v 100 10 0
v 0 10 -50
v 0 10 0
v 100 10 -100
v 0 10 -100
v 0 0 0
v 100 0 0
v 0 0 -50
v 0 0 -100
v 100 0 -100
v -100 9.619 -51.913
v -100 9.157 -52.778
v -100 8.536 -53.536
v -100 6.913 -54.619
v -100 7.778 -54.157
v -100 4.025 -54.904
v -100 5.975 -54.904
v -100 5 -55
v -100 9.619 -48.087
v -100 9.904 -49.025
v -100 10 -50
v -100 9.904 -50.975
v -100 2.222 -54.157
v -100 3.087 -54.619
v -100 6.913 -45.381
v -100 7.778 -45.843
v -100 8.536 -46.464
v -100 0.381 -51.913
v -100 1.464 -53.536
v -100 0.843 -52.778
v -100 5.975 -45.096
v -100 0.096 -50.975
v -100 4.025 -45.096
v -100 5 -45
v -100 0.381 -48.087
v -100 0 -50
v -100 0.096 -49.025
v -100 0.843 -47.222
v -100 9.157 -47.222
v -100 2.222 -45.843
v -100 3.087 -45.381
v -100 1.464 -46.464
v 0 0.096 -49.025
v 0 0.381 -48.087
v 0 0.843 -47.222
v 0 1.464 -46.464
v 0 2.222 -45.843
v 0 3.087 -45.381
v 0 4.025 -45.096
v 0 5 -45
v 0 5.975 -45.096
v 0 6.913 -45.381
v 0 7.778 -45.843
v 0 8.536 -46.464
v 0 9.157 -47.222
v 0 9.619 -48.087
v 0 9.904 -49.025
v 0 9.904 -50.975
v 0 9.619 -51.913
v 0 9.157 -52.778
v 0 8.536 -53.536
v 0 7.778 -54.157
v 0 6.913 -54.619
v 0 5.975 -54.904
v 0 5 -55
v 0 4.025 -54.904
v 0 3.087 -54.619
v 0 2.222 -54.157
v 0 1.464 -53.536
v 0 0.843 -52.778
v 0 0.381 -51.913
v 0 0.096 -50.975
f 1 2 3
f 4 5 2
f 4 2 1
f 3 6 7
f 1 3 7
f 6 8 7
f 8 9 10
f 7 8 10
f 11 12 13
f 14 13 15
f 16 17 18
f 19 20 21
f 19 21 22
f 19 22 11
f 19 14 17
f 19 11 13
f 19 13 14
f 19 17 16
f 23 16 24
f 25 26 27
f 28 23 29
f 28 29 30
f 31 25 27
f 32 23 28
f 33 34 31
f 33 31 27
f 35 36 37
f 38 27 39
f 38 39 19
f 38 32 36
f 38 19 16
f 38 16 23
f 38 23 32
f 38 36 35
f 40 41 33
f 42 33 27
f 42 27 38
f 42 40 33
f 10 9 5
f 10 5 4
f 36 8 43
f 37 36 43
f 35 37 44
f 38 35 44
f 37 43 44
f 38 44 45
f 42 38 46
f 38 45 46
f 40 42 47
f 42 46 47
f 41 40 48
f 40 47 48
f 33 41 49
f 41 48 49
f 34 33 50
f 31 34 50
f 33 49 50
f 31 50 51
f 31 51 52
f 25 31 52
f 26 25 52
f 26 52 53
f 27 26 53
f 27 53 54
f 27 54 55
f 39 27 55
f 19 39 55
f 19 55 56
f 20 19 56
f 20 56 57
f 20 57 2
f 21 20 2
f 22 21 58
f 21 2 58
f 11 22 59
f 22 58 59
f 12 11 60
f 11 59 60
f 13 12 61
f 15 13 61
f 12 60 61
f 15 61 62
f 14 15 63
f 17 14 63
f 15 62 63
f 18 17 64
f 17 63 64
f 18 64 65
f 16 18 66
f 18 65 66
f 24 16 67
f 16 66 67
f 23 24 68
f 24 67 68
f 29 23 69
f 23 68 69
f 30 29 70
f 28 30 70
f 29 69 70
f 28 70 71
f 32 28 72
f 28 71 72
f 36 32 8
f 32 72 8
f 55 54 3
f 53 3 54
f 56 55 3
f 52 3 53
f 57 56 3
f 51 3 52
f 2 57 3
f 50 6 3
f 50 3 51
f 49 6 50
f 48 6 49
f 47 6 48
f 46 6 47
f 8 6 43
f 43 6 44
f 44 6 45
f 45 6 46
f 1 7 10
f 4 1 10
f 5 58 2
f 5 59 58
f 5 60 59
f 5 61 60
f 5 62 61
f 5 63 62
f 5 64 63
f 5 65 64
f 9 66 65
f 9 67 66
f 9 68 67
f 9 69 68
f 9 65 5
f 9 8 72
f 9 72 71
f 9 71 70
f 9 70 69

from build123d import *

# Parameters (mm, degrees)
CROQUIS1_W              = 100
CROQUIS1_H              = 100
SALIENTE_EXTRUIR1_DEPTH = 10
CROQUIS2_R              = 5
SALIENTE_EXTRUIR2_DEPTH = 100


with BuildPart() as part:
    # Croquis1 → Saliente-Extruir1 (new body)
    with BuildSketch(Plane(origin=(0, 0, 0), x_dir=(1, 0, 0), z_dir=(0, 1, 0))):
        with Locations((50, 50)):
            Rectangle(CROQUIS1_W, CROQUIS1_H)
    extrude(amount=SALIENTE_EXTRUIR1_DEPTH)

    # Croquis2 → Saliente-Extruir2 (add)
    with BuildSketch(Plane.ZY):
        with Locations(Location((-50, 5, 0), (0, 0, 270))):
            Circle(CROQUIS2_R)
    extrude(amount=SALIENTE_EXTRUIR2_DEPTH)


solid = part.part
